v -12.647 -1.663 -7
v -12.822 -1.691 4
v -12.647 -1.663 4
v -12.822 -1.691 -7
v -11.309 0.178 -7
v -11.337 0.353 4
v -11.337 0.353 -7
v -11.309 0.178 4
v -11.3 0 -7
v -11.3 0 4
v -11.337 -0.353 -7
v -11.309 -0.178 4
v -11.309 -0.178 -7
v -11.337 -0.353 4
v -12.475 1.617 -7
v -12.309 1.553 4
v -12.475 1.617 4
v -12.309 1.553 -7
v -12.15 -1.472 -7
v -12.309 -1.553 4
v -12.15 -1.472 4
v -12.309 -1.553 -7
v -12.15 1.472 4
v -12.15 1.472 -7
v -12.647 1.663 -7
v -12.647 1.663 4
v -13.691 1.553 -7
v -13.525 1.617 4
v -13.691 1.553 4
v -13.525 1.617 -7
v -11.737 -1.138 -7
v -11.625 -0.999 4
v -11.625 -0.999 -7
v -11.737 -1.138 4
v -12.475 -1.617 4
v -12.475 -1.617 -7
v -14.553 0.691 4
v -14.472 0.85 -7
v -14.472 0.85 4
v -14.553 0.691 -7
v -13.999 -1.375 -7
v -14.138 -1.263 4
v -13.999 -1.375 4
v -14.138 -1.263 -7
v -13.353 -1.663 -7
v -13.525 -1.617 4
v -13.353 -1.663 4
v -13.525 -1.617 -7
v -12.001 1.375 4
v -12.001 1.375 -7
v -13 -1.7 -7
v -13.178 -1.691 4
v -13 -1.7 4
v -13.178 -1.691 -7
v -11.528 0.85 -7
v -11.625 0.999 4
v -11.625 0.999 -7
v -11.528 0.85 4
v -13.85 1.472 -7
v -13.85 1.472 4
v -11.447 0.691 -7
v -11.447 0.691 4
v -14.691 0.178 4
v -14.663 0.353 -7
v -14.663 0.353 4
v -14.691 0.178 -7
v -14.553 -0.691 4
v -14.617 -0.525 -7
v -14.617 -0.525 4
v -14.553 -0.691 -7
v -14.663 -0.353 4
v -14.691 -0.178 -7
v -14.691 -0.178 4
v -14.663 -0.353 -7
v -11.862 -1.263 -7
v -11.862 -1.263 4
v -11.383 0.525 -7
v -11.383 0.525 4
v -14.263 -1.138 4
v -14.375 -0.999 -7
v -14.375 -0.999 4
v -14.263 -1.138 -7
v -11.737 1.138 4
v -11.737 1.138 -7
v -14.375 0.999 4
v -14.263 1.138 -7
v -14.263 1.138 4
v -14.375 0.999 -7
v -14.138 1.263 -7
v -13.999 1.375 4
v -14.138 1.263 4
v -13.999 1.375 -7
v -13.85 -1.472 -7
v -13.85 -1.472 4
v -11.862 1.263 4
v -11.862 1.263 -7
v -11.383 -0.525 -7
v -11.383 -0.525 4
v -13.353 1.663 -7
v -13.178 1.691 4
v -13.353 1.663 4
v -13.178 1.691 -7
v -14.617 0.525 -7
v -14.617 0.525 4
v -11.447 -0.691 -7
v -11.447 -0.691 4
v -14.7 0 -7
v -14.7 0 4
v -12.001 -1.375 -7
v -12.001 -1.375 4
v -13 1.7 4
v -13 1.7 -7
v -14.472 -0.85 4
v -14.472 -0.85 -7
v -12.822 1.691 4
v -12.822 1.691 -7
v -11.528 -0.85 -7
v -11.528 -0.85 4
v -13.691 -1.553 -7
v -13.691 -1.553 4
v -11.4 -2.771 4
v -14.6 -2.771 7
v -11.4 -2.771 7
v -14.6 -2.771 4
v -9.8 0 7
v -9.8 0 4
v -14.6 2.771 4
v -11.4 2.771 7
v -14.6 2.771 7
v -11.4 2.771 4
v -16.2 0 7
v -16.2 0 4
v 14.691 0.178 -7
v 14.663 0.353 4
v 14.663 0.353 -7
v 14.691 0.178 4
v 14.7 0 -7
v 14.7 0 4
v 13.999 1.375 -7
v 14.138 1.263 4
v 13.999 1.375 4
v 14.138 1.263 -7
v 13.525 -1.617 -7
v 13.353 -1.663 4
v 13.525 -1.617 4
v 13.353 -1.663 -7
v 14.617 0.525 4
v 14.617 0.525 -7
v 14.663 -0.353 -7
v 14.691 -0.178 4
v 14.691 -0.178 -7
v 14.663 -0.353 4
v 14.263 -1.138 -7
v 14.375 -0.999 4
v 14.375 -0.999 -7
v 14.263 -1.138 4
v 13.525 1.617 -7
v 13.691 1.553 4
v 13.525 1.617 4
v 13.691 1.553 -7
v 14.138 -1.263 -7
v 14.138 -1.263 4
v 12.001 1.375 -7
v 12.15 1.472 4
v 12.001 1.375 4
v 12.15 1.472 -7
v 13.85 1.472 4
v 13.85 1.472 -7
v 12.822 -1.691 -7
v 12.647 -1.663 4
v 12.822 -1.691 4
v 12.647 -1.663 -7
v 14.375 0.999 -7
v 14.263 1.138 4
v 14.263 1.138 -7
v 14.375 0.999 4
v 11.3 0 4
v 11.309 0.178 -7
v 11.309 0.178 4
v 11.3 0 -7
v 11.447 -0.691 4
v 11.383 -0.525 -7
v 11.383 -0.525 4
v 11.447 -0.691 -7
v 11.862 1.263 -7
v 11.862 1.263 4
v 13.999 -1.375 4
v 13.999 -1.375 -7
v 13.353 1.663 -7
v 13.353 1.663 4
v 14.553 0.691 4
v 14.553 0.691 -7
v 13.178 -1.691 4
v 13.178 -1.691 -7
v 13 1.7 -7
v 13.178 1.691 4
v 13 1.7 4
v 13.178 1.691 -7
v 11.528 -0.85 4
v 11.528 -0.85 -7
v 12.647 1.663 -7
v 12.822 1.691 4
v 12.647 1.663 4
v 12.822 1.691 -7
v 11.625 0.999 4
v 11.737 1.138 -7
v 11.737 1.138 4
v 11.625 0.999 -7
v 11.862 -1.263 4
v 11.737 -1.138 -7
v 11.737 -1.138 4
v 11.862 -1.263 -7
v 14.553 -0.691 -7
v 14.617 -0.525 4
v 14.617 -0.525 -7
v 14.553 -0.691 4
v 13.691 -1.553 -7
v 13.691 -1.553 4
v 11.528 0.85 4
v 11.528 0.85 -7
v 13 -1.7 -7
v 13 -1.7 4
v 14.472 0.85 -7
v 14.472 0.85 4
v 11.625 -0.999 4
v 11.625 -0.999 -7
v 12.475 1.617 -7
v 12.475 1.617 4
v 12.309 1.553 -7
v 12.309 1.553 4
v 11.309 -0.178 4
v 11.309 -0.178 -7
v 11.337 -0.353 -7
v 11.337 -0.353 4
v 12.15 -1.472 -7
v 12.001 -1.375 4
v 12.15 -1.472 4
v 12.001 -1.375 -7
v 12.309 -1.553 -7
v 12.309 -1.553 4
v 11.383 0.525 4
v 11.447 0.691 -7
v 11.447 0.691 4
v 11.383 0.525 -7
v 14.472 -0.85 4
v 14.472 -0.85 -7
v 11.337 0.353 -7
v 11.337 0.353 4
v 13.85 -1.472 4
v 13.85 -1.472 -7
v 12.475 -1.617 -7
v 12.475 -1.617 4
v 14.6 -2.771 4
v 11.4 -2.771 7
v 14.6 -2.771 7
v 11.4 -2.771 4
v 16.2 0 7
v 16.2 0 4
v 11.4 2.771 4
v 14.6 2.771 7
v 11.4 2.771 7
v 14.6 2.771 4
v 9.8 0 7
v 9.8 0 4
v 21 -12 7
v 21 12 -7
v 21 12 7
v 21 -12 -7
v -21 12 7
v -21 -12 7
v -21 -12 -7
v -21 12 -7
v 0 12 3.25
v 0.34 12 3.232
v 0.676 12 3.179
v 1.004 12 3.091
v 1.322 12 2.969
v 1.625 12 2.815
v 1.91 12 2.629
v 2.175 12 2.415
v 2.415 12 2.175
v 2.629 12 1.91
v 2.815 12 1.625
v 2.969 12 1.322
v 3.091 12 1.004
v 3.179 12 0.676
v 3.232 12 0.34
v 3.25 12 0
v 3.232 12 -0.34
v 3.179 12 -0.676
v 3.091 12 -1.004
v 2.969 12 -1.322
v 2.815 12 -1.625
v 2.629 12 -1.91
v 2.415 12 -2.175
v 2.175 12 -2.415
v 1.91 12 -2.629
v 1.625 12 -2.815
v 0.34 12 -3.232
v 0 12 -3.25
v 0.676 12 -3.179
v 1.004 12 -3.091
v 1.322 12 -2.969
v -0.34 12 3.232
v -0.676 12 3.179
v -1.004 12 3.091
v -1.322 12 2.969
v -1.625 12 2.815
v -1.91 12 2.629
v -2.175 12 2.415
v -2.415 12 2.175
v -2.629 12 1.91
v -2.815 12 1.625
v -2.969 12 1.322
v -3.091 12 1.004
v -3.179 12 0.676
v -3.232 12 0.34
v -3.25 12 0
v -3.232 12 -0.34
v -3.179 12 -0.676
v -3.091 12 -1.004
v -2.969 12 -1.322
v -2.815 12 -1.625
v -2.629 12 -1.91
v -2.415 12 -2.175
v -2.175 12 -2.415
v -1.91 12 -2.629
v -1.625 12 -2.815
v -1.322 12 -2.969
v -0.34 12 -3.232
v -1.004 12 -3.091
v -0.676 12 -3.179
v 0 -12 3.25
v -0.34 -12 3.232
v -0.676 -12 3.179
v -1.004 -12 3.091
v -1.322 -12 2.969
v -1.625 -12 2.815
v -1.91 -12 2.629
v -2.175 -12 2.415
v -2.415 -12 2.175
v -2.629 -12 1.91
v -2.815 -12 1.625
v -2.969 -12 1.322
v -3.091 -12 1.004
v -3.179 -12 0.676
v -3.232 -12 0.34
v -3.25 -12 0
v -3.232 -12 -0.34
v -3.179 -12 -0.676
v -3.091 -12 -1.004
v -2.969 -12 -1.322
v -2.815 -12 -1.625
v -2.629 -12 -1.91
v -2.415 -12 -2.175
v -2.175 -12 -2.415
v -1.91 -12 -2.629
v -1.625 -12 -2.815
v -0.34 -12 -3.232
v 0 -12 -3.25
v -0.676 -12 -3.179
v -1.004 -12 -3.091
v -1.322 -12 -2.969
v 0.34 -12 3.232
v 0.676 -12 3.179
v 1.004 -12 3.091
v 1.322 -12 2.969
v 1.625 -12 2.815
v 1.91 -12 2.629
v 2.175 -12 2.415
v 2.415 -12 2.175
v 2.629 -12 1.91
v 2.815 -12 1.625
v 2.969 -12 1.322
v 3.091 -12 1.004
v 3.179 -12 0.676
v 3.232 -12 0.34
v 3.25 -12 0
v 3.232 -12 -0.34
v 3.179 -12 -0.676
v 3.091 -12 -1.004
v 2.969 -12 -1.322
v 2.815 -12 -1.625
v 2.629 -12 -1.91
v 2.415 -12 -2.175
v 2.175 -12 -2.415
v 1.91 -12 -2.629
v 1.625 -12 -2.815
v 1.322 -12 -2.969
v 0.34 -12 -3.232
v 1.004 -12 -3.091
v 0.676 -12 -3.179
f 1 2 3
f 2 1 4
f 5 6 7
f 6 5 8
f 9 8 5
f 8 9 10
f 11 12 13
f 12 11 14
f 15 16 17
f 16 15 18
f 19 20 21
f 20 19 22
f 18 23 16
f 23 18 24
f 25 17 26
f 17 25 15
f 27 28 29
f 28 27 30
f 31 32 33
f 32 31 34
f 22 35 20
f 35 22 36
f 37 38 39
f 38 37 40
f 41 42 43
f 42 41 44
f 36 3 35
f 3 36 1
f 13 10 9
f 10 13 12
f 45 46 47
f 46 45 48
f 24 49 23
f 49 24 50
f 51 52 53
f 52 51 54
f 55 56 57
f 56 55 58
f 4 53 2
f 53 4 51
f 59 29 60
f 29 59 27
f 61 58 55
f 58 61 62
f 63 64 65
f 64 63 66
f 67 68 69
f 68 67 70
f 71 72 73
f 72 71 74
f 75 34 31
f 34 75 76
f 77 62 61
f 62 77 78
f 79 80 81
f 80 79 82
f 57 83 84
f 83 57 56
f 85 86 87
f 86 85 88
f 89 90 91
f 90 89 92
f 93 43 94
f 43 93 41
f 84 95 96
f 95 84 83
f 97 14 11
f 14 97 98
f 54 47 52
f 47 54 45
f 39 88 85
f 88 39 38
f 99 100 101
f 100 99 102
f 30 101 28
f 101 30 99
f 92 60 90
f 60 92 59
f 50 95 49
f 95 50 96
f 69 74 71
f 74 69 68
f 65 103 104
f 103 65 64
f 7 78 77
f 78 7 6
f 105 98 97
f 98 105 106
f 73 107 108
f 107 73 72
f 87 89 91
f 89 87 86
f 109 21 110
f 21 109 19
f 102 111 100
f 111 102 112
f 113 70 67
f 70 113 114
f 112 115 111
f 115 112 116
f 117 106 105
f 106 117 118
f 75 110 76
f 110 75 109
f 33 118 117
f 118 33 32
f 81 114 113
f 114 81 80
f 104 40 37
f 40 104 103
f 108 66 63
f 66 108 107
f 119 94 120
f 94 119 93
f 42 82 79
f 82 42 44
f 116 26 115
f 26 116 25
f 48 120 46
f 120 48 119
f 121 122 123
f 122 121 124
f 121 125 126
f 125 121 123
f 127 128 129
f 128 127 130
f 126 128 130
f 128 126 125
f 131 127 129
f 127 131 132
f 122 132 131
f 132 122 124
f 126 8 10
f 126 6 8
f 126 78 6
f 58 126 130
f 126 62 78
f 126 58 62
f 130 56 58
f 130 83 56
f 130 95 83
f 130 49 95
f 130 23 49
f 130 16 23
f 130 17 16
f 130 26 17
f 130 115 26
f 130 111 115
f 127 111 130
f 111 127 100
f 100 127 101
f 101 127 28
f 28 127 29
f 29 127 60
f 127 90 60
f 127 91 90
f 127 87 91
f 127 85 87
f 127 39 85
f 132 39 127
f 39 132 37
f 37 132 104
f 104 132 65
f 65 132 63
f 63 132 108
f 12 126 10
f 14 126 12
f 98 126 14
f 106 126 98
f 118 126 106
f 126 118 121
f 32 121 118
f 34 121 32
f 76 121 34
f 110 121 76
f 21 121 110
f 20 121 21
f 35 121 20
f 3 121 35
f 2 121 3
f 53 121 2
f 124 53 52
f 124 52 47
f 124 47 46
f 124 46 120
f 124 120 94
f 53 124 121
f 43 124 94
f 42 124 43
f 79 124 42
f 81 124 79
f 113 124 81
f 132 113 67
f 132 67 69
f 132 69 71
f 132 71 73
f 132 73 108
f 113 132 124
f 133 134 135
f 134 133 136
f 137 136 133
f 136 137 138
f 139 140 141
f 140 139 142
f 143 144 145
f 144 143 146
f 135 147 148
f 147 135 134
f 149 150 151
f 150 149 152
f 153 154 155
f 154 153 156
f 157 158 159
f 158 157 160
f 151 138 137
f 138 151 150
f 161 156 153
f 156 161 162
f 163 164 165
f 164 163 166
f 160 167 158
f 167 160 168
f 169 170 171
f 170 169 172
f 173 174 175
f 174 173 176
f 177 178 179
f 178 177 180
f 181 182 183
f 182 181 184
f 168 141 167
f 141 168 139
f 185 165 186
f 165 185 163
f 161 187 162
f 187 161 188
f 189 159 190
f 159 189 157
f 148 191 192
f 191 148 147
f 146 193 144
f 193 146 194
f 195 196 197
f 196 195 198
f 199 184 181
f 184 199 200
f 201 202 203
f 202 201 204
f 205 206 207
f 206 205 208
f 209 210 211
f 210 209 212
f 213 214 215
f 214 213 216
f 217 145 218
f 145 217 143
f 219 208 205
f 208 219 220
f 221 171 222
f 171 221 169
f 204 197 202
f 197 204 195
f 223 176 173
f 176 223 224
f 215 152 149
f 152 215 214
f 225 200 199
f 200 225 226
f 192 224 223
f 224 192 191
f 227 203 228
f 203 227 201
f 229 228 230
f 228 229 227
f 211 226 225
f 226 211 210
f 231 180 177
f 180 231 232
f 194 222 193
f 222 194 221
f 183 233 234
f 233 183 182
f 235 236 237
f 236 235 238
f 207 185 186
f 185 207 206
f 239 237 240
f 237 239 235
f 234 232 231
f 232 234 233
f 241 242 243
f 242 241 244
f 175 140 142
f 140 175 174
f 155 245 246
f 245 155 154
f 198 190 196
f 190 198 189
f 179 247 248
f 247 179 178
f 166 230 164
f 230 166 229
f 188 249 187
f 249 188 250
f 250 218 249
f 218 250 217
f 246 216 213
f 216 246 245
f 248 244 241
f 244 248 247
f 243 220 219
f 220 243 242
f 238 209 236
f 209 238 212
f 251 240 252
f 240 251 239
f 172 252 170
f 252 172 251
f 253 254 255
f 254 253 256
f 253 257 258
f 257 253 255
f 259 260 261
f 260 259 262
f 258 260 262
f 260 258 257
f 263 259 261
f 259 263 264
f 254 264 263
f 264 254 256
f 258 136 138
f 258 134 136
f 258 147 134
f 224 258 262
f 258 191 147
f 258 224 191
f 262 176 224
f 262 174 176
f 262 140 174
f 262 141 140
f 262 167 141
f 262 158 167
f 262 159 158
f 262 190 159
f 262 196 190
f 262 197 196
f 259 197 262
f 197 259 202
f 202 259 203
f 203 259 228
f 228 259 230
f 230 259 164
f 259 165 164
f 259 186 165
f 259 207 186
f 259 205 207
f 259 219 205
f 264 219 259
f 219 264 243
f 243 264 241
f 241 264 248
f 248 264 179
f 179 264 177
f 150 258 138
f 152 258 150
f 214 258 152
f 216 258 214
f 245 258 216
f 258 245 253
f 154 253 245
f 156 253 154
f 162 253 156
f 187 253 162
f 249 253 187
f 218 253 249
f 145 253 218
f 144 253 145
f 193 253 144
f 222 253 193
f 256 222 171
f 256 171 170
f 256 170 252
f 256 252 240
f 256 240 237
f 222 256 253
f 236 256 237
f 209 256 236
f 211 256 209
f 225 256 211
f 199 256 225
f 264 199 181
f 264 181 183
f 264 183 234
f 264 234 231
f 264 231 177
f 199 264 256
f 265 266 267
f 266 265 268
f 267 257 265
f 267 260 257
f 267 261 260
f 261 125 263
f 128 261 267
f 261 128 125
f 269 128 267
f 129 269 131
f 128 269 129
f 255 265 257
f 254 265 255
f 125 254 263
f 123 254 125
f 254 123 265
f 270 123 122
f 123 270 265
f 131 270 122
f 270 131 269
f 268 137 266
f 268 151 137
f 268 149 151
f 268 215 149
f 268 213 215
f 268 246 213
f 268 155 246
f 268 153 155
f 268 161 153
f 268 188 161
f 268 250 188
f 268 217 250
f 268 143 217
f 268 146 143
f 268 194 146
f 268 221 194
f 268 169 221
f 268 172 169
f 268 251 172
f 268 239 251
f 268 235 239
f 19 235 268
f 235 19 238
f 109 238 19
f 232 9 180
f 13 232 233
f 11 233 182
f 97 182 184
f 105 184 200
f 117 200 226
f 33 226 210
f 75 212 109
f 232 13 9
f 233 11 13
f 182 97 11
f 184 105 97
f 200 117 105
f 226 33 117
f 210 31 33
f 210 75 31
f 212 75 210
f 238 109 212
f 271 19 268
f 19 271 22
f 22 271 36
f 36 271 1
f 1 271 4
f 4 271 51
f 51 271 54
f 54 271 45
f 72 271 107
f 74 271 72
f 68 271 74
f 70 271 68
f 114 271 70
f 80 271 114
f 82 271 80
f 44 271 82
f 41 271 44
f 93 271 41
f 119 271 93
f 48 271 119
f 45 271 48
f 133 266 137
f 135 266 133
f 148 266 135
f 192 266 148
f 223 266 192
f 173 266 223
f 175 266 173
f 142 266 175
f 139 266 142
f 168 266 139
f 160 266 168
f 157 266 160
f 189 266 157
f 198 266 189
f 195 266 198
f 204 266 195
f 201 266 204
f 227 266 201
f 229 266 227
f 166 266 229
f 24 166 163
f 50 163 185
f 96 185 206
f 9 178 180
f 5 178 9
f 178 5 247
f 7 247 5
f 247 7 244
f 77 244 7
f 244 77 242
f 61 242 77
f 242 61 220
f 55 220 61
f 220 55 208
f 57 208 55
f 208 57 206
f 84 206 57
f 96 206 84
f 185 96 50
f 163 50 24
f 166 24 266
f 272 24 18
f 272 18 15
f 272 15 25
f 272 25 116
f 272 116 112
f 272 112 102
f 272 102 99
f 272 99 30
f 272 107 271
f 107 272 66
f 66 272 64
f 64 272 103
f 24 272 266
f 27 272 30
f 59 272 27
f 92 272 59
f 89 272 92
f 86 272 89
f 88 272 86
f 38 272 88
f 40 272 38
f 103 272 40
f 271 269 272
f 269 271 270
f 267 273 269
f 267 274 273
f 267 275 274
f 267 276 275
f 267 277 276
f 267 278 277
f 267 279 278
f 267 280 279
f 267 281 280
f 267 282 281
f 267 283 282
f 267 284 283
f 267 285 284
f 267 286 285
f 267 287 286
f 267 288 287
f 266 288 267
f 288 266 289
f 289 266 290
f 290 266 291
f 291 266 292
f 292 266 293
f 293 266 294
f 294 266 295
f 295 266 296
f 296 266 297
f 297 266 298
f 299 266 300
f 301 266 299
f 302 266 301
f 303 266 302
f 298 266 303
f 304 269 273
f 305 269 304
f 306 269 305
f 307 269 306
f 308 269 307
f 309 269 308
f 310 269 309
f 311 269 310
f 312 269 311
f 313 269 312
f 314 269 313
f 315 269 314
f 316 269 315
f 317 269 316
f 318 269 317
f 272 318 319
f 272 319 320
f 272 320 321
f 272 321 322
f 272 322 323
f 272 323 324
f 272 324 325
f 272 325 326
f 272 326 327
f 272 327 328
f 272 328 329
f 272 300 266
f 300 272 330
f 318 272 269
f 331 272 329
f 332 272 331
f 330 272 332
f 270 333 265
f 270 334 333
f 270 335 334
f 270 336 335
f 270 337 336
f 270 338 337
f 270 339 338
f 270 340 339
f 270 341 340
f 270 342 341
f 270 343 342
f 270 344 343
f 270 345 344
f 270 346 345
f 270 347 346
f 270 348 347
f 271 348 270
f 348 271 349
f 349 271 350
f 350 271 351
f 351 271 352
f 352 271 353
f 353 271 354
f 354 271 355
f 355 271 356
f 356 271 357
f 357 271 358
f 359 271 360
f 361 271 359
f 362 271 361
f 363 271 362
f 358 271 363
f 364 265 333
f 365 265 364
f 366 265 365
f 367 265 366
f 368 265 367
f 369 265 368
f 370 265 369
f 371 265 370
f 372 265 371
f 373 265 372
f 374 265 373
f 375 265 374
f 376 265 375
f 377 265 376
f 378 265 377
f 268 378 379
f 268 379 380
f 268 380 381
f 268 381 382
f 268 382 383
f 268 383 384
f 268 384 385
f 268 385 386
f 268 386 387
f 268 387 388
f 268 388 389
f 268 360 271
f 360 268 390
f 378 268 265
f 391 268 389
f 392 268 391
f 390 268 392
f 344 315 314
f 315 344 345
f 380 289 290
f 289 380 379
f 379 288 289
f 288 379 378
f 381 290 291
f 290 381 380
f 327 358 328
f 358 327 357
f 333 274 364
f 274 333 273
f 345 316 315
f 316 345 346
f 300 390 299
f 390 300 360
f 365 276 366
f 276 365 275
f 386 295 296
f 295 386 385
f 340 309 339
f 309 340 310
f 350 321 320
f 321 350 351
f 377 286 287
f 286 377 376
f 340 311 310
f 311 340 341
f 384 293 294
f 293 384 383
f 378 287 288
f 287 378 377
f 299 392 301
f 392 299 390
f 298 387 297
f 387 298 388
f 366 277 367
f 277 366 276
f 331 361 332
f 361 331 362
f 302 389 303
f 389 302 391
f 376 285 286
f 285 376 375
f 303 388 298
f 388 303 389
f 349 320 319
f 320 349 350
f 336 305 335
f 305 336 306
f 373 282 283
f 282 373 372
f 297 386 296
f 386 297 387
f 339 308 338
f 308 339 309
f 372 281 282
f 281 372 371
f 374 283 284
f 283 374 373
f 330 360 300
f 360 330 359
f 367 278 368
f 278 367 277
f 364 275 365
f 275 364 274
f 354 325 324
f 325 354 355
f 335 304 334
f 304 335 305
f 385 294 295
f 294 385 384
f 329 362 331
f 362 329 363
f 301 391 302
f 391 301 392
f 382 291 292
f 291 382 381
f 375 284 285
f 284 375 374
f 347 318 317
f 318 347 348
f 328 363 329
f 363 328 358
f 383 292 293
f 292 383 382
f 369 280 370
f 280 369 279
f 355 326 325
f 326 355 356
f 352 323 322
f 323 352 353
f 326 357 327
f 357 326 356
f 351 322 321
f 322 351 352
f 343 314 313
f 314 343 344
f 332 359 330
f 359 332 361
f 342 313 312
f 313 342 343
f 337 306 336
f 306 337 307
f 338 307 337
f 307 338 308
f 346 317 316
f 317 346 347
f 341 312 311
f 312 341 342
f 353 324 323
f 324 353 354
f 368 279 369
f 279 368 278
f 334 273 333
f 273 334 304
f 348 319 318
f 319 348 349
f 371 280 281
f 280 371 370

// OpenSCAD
// Cable strain-relief clamp for 6 mm bundle.
$fn = 60;
eps = 0.02;
body_l = 42;
body_w = 24;
body_h = 14;
cable_d = 6.5;
bolt_pitch = 26;
difference() {
    cube([body_l, body_w, body_h], center = true);
    translate([0, -body_w / 2 - eps, 0]) rotate([-90, 0, 0]) cylinder(d = cable_d, h = body_w + 2 * eps);
    for (x = [-bolt_pitch / 2, bolt_pitch / 2]) {
        translate([x, 0, -body_h / 2 - eps]) cylinder(d = 3.4, h = body_h + 2 * eps);
        translate([x, 0, body_h / 2 - 3]) cylinder(d = 6.4, h = 3 + eps, $fn = 6);
    }
}
